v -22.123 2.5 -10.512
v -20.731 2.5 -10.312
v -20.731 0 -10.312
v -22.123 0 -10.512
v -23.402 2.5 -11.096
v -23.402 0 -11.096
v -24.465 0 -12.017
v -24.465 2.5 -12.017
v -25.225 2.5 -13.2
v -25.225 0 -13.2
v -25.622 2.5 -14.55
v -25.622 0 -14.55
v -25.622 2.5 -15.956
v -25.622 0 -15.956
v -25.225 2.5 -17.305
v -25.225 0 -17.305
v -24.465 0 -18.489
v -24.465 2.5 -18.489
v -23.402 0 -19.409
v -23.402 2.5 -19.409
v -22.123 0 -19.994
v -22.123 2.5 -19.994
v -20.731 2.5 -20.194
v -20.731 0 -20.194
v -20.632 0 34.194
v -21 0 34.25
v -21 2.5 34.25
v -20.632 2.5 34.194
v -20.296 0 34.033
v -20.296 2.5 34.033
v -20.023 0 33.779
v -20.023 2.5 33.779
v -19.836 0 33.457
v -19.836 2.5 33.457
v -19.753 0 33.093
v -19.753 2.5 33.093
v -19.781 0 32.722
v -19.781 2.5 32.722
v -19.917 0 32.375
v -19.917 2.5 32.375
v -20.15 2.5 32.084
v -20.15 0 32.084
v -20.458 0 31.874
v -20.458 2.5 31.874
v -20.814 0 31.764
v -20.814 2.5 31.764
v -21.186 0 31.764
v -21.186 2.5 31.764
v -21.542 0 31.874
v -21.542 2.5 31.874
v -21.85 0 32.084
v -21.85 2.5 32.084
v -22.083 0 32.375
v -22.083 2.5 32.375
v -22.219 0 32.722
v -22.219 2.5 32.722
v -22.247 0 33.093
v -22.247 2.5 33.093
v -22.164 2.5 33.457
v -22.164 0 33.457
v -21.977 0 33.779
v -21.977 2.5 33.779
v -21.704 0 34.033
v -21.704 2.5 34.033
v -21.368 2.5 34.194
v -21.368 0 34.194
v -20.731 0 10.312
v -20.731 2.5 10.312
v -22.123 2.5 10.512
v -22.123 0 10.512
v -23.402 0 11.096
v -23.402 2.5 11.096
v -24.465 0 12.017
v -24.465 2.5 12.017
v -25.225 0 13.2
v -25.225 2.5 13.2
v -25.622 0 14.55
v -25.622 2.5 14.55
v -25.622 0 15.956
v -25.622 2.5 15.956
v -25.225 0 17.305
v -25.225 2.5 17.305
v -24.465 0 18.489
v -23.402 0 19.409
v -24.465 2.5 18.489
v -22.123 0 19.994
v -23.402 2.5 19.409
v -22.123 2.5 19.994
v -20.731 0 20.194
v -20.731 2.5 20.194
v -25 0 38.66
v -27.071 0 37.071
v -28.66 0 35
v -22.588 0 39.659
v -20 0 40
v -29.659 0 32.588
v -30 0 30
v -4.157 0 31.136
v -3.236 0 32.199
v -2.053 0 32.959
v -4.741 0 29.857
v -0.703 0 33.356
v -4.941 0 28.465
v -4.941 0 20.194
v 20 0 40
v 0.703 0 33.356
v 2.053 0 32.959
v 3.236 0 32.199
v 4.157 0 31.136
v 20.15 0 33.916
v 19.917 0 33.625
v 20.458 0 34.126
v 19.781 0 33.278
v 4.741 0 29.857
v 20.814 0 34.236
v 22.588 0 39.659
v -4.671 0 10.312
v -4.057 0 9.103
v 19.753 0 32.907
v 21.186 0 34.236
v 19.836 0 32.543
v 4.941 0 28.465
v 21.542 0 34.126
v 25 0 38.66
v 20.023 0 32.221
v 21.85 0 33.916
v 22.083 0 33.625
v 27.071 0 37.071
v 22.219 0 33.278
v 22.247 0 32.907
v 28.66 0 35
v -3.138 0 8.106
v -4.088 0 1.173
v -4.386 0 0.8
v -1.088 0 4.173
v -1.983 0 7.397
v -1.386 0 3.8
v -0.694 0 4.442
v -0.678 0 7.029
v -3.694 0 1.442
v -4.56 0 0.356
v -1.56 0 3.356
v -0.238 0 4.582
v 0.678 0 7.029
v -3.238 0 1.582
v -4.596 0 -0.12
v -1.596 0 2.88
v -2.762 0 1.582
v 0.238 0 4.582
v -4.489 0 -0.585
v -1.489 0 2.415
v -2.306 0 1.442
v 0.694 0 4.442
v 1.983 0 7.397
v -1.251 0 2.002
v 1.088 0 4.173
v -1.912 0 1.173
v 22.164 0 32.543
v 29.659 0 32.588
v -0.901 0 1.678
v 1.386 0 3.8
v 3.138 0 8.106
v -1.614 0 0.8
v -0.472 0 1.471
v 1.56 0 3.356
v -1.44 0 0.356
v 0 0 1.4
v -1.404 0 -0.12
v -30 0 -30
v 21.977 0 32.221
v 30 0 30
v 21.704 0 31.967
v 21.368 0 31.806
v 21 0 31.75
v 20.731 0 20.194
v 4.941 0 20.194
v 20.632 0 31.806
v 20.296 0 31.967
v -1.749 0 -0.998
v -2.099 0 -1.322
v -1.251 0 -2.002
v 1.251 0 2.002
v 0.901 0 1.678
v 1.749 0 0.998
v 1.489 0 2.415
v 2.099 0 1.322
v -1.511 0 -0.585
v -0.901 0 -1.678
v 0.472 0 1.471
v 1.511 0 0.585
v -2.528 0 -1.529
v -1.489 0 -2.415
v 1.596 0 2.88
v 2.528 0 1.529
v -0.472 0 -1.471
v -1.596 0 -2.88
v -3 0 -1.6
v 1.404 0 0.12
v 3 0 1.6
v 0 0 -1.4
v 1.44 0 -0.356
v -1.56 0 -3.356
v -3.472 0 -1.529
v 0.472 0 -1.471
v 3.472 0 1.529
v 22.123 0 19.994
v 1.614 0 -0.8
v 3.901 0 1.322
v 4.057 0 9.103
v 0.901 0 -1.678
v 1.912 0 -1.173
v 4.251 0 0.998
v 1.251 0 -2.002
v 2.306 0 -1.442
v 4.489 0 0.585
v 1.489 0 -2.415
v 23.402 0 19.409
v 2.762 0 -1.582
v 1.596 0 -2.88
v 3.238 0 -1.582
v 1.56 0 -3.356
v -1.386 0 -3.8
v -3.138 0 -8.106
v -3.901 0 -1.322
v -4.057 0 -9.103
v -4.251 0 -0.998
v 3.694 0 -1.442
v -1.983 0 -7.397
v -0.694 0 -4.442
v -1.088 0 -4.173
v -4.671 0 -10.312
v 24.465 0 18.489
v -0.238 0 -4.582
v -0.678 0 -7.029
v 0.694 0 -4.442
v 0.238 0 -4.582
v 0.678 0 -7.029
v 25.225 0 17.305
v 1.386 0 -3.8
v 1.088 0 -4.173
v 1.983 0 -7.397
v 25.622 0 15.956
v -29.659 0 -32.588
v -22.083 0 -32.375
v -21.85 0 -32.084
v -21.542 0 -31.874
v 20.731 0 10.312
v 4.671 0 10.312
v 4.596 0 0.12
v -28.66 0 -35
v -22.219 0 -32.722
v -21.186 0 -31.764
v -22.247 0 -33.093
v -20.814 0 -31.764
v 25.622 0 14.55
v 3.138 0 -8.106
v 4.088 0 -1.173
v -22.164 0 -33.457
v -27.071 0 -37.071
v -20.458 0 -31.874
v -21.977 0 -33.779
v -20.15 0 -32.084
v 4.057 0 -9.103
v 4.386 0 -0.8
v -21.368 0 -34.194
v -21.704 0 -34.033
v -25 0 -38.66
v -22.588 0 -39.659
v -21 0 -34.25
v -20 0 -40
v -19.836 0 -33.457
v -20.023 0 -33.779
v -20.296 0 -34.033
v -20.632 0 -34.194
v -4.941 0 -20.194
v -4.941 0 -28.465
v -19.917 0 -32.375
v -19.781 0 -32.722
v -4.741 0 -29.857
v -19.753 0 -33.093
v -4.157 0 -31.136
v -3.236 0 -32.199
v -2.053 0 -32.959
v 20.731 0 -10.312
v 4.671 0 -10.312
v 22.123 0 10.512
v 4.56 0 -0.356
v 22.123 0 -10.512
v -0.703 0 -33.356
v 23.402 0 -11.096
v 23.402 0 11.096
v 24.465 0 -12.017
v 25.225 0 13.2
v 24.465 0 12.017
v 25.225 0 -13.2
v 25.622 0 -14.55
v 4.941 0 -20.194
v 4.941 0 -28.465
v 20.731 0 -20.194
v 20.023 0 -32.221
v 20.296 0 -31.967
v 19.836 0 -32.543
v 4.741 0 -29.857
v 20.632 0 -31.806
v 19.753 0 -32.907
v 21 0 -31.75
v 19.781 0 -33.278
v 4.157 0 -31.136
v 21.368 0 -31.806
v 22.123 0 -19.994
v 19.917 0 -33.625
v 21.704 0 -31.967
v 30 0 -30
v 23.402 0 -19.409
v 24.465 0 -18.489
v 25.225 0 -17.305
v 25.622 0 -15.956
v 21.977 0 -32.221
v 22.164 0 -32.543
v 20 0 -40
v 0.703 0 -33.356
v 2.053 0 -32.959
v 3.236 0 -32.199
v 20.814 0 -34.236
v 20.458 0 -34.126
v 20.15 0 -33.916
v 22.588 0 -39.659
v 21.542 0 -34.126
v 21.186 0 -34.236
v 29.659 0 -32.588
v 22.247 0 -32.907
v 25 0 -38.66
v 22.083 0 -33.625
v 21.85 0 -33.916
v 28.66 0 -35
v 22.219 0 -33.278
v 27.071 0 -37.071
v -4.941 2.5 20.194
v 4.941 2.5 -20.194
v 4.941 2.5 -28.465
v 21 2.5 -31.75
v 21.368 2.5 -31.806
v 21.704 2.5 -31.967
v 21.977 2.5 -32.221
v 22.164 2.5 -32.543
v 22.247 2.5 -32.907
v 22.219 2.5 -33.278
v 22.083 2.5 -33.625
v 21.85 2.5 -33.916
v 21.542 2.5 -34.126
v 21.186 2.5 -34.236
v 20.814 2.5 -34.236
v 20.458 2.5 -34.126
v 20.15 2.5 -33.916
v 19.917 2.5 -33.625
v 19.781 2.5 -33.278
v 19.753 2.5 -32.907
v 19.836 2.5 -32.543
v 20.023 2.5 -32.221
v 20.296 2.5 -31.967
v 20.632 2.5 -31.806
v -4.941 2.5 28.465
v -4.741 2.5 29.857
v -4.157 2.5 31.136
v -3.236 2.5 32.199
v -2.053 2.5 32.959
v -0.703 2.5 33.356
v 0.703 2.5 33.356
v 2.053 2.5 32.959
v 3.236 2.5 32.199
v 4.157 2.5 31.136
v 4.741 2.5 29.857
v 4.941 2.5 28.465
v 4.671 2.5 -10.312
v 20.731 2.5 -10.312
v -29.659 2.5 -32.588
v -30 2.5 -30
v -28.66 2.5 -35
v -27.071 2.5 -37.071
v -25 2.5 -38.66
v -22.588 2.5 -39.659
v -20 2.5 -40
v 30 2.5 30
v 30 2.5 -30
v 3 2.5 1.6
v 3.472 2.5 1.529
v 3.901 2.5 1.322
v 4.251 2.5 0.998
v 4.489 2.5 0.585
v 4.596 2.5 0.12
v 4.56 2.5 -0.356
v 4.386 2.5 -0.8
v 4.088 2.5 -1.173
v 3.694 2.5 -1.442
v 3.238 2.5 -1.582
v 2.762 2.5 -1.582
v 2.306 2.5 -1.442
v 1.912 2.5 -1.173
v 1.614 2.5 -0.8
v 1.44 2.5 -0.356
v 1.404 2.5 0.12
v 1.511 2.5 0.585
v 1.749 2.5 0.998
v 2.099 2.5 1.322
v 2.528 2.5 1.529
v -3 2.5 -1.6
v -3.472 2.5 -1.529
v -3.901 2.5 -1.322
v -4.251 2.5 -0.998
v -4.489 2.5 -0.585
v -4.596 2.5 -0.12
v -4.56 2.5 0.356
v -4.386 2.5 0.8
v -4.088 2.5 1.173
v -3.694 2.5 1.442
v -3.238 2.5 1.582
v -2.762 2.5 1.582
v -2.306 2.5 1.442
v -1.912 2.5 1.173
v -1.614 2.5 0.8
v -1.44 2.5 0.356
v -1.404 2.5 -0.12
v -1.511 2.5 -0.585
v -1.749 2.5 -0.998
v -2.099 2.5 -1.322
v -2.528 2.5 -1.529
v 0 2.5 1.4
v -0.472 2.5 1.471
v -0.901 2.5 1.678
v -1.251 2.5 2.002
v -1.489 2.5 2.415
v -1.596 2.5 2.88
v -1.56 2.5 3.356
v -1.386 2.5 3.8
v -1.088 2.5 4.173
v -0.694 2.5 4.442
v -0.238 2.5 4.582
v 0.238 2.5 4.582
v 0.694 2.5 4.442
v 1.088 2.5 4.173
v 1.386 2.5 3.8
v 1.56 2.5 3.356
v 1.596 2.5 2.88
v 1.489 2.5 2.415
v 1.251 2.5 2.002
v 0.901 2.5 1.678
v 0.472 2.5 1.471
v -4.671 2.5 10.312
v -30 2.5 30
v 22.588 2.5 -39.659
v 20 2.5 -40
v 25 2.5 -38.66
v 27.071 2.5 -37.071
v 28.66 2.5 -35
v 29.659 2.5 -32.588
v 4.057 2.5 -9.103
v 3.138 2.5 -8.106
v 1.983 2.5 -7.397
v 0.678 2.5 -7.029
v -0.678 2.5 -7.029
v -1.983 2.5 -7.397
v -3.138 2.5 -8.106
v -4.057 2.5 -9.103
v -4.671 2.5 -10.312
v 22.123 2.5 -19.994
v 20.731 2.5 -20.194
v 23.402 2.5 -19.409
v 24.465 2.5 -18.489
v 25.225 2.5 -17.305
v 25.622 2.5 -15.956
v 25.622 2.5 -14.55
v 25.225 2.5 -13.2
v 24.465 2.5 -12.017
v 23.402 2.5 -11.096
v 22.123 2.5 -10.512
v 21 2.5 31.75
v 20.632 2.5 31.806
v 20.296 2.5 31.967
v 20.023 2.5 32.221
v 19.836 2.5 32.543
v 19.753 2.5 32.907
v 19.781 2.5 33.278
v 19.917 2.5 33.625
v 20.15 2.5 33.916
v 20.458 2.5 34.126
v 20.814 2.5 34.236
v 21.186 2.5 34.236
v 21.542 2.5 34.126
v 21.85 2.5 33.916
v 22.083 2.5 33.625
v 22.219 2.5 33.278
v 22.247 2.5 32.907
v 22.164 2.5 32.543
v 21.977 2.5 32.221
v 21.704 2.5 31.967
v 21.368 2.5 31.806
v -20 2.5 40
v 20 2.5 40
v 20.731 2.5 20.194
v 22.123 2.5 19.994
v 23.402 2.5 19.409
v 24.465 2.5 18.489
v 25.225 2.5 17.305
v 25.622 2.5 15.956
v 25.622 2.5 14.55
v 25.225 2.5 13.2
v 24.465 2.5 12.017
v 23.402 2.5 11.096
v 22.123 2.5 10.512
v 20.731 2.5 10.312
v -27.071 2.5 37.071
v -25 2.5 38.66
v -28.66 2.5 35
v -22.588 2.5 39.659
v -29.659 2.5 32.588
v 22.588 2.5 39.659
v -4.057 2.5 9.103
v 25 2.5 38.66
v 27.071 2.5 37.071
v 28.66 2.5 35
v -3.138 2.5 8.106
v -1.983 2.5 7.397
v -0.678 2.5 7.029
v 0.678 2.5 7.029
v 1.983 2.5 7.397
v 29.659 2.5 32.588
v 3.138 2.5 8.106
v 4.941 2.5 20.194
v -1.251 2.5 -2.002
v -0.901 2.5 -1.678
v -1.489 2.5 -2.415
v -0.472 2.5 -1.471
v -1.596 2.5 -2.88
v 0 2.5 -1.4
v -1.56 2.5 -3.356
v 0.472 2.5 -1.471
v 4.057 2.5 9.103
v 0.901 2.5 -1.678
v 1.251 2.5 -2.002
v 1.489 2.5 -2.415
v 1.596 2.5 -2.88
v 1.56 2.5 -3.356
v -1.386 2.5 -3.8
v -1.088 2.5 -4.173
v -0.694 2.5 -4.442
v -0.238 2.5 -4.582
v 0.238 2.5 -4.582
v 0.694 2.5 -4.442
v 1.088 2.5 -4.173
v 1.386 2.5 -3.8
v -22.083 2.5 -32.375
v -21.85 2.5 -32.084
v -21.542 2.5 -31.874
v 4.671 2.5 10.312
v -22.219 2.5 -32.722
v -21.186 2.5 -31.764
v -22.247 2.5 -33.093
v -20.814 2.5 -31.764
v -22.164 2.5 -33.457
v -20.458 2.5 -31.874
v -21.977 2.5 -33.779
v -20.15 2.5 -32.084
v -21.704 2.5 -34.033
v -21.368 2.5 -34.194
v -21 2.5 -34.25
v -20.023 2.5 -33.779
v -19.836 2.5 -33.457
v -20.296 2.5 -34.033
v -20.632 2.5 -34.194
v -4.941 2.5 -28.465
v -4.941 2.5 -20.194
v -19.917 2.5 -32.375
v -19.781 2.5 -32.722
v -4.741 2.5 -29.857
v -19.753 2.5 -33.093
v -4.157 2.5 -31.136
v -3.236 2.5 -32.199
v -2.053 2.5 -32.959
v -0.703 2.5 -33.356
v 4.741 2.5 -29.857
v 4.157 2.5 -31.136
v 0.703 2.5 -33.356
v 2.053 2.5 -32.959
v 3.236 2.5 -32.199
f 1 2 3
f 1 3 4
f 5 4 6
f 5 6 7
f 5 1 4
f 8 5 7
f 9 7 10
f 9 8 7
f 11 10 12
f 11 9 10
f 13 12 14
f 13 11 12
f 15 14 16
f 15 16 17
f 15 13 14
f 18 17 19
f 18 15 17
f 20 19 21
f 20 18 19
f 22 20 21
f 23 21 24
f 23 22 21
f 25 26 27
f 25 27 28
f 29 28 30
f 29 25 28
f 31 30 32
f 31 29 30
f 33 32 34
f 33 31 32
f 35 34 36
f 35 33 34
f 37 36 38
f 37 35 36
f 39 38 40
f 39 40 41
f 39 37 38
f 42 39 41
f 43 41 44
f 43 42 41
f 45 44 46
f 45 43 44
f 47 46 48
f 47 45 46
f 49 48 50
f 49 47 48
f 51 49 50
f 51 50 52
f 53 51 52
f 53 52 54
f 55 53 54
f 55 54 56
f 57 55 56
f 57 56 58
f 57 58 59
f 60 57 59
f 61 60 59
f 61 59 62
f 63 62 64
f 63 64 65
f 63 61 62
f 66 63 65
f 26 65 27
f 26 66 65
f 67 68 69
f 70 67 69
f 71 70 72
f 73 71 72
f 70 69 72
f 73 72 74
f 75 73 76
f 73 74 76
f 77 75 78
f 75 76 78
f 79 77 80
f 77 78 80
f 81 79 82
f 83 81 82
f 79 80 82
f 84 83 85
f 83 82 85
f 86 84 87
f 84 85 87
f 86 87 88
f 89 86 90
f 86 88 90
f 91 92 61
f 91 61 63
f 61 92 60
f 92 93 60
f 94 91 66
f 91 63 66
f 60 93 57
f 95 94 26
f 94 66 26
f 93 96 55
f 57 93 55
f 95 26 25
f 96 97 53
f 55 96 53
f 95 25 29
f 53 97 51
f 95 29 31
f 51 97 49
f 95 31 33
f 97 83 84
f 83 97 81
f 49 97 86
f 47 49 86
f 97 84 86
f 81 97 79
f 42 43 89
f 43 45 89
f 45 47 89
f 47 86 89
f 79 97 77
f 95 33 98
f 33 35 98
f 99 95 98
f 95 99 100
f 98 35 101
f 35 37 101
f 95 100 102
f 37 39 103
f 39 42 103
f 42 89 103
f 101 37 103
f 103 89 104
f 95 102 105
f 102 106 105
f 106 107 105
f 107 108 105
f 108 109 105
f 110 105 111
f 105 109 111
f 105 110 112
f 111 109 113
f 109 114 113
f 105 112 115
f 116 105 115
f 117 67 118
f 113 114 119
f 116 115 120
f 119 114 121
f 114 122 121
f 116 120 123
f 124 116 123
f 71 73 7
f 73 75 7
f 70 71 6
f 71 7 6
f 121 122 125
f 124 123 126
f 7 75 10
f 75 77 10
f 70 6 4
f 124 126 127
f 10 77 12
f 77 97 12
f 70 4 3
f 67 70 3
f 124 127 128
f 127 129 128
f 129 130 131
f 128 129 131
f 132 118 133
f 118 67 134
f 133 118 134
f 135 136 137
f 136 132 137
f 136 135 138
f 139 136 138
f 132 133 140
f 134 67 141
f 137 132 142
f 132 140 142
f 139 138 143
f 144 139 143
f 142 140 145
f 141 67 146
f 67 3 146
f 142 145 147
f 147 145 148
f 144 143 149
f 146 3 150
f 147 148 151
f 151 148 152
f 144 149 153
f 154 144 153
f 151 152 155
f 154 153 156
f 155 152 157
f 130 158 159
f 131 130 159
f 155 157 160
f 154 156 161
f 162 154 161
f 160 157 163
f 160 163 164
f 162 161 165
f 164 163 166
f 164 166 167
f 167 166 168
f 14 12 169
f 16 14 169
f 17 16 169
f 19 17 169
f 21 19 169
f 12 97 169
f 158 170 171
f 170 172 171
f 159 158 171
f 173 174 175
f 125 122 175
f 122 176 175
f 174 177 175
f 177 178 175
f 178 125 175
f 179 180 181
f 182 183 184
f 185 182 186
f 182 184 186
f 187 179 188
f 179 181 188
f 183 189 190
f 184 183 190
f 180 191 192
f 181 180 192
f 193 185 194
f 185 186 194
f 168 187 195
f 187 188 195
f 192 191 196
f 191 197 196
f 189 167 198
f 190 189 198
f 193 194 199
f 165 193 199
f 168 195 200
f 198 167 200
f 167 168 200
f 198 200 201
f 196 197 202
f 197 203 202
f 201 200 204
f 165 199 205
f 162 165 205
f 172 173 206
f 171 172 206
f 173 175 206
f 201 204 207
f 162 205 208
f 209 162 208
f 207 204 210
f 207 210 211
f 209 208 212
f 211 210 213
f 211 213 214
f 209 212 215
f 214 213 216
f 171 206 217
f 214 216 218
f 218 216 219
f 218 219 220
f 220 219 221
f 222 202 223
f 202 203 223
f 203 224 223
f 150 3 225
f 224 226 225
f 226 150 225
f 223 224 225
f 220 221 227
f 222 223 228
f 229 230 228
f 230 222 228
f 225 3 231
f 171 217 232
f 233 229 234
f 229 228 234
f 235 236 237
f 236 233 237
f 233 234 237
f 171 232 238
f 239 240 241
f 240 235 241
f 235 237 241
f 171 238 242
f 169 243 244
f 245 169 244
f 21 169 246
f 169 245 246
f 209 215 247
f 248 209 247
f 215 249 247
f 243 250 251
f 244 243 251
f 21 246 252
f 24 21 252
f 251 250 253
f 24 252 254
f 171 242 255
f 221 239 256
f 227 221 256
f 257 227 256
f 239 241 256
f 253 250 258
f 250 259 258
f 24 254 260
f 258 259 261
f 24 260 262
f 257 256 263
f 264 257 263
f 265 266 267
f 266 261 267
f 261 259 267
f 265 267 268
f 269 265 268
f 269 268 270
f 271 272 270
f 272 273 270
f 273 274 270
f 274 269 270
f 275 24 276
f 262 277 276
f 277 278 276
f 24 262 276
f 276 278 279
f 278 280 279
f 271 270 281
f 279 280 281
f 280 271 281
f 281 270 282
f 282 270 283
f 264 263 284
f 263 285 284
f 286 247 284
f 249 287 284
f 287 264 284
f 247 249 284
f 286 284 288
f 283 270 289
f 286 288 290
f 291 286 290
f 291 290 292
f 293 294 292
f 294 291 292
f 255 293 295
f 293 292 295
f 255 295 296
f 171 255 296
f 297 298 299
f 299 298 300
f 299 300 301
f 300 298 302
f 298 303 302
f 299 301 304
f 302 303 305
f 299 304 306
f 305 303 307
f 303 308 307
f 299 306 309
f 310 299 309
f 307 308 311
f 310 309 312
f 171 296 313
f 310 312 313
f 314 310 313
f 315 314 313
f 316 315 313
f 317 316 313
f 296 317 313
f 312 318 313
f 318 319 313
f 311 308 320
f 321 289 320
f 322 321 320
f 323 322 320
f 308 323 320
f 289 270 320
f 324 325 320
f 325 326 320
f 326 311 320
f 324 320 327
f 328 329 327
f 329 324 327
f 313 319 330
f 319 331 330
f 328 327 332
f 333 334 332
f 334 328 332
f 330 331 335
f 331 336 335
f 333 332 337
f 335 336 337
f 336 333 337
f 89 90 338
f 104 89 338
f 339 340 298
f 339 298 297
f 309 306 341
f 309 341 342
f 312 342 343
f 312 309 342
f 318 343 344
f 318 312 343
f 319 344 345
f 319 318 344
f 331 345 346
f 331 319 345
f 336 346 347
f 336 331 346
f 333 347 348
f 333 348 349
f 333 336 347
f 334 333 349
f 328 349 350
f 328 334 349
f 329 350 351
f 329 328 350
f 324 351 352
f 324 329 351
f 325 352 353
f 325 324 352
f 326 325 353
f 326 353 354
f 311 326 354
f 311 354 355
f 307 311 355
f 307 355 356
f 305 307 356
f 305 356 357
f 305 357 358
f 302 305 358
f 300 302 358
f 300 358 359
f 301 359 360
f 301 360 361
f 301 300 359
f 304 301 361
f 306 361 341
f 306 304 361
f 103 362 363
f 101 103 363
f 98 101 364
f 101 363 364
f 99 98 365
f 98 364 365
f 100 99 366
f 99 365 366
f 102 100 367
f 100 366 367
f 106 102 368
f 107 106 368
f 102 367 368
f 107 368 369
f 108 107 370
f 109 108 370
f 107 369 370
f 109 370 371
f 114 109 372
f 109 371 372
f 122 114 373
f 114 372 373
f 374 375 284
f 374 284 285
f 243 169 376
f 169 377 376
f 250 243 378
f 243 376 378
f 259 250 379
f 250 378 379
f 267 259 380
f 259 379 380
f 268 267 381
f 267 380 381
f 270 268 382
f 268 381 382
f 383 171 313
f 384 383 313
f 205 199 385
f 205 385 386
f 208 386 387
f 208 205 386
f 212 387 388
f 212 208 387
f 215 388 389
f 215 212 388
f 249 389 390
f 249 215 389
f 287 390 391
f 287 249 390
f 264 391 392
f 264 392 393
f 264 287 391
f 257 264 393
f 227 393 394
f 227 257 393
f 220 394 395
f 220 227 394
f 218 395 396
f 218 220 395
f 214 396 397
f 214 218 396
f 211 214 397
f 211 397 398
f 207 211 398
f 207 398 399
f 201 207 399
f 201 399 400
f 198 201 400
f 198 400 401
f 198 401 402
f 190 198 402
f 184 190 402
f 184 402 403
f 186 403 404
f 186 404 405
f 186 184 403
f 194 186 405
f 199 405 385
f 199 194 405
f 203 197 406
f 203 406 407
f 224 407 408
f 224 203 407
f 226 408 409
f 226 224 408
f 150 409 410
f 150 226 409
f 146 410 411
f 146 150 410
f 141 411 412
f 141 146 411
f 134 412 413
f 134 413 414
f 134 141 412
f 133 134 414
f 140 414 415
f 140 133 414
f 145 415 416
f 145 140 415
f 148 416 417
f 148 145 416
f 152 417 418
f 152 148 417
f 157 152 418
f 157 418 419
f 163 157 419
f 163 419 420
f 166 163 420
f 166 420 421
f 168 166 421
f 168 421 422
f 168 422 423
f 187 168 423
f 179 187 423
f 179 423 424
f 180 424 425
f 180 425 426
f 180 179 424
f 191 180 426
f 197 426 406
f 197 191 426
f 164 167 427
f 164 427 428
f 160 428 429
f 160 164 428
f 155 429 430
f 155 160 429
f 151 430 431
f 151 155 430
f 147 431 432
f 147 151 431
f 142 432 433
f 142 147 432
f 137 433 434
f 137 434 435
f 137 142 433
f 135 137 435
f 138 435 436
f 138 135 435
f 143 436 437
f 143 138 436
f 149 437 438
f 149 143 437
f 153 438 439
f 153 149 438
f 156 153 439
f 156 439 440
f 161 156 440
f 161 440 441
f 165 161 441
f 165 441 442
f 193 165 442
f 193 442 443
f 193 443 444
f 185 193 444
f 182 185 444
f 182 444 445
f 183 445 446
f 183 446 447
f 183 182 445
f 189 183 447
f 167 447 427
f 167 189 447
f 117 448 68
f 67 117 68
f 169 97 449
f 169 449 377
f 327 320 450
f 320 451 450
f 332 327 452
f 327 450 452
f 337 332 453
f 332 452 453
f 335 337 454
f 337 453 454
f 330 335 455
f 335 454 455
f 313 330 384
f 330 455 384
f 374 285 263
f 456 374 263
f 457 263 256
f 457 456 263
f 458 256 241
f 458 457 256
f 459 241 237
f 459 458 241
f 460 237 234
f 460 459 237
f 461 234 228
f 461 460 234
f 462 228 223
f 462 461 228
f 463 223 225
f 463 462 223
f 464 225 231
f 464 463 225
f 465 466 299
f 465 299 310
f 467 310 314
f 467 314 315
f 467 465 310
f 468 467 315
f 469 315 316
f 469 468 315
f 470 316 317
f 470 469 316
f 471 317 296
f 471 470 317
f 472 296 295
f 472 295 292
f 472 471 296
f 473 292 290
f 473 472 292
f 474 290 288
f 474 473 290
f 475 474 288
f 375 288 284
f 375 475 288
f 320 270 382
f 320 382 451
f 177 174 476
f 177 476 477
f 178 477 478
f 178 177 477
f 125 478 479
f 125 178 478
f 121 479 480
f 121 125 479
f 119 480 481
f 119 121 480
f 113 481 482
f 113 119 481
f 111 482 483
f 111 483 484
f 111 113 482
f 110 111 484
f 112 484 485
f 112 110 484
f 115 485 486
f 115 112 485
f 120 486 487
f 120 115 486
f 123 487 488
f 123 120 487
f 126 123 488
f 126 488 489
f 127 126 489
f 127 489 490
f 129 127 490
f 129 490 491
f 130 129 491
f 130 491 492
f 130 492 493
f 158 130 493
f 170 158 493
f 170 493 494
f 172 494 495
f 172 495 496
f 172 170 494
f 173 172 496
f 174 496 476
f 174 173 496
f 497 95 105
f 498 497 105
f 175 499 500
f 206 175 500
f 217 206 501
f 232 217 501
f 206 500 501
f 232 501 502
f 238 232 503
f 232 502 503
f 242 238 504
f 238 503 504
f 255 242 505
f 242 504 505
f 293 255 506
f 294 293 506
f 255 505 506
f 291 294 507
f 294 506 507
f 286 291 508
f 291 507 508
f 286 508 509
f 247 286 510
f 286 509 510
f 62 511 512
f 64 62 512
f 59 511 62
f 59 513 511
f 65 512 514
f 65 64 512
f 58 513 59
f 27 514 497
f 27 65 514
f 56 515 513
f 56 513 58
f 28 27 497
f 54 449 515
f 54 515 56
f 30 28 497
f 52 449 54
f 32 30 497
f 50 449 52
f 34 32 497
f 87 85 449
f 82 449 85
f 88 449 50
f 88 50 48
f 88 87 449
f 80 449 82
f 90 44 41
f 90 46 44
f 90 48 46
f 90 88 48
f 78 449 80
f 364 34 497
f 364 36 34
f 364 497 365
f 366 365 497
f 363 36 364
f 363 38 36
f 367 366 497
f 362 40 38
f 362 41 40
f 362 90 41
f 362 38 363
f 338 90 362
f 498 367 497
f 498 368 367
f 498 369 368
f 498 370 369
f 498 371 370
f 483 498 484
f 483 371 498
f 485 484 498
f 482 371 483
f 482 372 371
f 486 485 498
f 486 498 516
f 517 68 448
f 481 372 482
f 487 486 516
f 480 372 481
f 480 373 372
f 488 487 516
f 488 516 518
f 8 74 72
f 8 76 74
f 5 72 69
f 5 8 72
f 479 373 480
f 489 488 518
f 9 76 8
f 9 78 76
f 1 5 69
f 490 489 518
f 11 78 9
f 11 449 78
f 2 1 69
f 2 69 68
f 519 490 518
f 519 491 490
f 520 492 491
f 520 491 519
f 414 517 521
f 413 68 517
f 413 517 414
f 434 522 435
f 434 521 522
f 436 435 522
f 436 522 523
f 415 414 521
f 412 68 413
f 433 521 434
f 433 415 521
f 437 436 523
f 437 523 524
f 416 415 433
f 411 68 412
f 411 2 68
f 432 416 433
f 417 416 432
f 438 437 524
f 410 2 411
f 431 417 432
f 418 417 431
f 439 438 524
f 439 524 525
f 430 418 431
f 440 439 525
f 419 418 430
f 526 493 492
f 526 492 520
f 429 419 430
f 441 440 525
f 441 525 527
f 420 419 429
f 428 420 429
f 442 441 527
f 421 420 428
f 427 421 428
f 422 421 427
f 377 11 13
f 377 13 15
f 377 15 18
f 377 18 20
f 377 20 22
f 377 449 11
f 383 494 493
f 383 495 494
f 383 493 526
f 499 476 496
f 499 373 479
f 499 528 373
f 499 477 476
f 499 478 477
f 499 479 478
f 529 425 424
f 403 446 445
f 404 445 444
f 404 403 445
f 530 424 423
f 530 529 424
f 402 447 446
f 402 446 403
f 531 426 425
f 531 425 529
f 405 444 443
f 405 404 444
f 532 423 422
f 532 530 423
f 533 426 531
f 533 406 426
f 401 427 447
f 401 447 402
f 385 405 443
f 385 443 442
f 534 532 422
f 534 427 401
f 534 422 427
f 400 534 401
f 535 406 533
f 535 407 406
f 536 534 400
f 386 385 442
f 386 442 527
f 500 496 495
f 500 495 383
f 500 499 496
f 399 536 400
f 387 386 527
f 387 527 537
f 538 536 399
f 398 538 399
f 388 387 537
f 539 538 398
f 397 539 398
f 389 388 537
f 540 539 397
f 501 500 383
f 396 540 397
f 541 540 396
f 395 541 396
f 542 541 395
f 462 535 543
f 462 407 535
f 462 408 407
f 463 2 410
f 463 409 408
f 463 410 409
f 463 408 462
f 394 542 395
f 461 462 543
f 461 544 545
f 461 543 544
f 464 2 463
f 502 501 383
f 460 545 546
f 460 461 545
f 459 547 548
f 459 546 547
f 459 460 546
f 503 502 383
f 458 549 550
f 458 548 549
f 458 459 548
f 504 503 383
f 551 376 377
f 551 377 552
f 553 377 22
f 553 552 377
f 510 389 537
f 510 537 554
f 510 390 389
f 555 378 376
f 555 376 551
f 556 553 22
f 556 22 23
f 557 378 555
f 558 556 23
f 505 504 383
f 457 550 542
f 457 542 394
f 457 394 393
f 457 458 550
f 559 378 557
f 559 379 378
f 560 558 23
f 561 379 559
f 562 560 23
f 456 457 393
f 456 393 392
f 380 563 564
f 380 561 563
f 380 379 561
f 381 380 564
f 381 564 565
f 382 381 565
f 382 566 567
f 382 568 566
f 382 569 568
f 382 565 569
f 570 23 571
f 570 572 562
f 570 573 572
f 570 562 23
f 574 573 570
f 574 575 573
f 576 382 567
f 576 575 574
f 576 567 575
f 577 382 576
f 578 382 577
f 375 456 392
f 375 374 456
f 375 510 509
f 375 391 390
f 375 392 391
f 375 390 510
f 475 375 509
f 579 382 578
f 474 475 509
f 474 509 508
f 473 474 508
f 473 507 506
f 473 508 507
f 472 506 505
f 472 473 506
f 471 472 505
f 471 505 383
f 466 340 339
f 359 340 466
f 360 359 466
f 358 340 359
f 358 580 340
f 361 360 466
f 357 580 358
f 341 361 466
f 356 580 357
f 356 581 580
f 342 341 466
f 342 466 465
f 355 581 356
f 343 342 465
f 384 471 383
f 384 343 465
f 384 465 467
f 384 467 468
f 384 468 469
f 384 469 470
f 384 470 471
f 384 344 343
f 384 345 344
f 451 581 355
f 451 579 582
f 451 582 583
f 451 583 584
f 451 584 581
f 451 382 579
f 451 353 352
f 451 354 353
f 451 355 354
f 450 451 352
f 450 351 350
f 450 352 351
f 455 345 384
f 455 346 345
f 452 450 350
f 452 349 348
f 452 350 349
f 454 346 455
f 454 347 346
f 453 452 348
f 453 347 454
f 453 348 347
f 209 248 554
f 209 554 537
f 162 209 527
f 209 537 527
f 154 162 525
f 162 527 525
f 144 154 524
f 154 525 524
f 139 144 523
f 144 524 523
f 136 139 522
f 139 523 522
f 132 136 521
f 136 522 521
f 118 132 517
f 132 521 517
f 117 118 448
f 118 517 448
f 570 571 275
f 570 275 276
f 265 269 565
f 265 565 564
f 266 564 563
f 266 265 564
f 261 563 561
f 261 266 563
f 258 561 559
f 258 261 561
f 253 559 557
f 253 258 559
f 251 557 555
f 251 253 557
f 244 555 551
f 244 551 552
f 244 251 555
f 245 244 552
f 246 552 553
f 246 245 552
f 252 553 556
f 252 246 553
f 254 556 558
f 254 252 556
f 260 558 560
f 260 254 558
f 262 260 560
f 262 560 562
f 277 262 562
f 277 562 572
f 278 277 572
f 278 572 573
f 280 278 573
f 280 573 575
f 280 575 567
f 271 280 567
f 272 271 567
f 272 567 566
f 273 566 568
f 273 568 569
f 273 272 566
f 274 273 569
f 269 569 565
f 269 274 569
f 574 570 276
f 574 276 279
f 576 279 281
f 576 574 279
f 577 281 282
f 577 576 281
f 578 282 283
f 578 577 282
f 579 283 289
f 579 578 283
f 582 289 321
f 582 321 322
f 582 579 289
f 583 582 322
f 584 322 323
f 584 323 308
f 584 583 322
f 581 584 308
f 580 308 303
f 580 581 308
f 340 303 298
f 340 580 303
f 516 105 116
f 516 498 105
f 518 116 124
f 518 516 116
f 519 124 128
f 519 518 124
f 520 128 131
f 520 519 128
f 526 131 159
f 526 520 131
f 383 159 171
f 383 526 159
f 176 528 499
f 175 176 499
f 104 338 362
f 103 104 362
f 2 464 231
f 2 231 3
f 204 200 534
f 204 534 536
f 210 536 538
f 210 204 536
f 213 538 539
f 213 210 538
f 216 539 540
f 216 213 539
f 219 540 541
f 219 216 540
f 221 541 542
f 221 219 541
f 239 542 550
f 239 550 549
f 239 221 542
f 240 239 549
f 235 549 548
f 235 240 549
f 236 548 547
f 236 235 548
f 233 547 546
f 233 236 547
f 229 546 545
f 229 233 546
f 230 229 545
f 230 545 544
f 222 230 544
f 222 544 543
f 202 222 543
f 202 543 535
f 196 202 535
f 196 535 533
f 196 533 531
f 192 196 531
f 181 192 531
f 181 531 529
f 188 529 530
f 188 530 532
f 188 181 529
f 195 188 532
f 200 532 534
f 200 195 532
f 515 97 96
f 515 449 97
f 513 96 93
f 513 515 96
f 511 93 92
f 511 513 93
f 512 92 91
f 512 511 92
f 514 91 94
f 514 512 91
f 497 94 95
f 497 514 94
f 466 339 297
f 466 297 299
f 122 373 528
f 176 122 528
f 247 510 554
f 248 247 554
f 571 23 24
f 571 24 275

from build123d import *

# Parameters (mm, degrees)
SKETCH_1_W          = 60
SKETCH_1_H          = 80
SKETCH_1_R          = 1.25
SKETCH_1_R_2        = 1.6
EXTRUDE_1_DEPTH     = 2.5
FILLET_1_R          = 10
CUT_EXTRUDE_1_DEPTH = 2.5
CUT_EXTRUDE_2_DEPTH = 2.5


with BuildPart() as part:
    # 草图1 → 凸台-拉伸1 (new body)
    with BuildSketch(Plane(origin=(0, 0, 0), x_dir=(1, 0, 0), z_dir=(0, 1, 0))):
        Rectangle(SKETCH_1_W, SKETCH_1_H)
        with Locations(Location((21, 33, 0), (0, 0, 270))):
            Circle(SKETCH_1_R, mode=Mode.SUBTRACT)
        with Locations(Location((-21, 33, 0), (0, 0, 90))):
            Circle(SKETCH_1_R, mode=Mode.SUBTRACT)
        with Locations(Location((-21, -33, 0), (0, 0, 270))):
            Circle(SKETCH_1_R, mode=Mode.SUBTRACT)
        with Locations(Location((21, -33, 0), (0, 0, 90))):
            Circle(SKETCH_1_R, mode=Mode.SUBTRACT)
        with Locations(Location((0, 3, 0), (0, 0, 270))):
            Circle(SKETCH_1_R_2, mode=Mode.SUBTRACT)
        with Locations(Location((3, 0, 0), (0, 0, 270))):
            Circle(SKETCH_1_R_2, mode=Mode.SUBTRACT)
        with Locations(Location((0, -3, 0), (0, 0, 90))):
            Circle(SKETCH_1_R_2, mode=Mode.SUBTRACT)
        with Locations(Location((-3, 0, 0), (0, 0, 90))):
            Circle(SKETCH_1_R_2, mode=Mode.SUBTRACT)
    extrude(amount=EXTRUDE_1_DEPTH)

    # 圆角1
    fillet_1_edges = [part.edges().sort_by_distance(p)[0] for p in [
        (30, 1.25, 40),
        (-30, 1.25, 40),
        (-30, 1.25, -40),
        (30, 1.25, -40),
    ]]
    fillet(fillet_1_edges, radius=FILLET_1_R)

    # 草图2 → 切除-拉伸1 (cut)
    with BuildSketch(Plane(origin=(0, 2.5, 0), x_dir=(1, 0, 0), z_dir=(0, 1, 0))):
        with BuildLine():
            Line((-20.730933361, 20.193862548), (20.730933361, 20.193862548))
            ThreePointArc((20.730933361, 20.193862548), (25.671984835, 15.252811074), (20.730933361, 10.311759599))
            Line((20.730933361, 10.311759599), (-20.730933361, 10.311759599))
            ThreePointArc((-20.730933361, 10.311759599), (-25.671984835, 15.252811074), (-20.730933361, 20.193862548))
        make_face()
        with BuildLine():
            Line((-20.730933361, -20.193862548), (20.730933361, -20.193862548))
            ThreePointArc((20.730933361, -20.193862548), (25.671984835, -15.252811074), (20.730933361, -10.311759599))
            Line((20.730933361, -10.311759599), (-20.730933361, -10.311759599))
            ThreePointArc((-20.730933361, -10.311759599), (-25.671984835, -15.252811074), (-20.730933361, -20.193862548))
        make_face()
    extrude(amount=-CUT_EXTRUDE_1_DEPTH, mode=Mode.SUBTRACT)

    # 草图3 → 切除-拉伸2 (cut)
    with BuildSketch(Plane(origin=(0, 2.5, 0), x_dir=(1, 0, 0), z_dir=(0, 1, 0))):
        with BuildLine():
            Line((-4.941051475, 11.922972036), (-4.941051475, 28.46475306))
            ThreePointArc((-4.941051475, 28.46475306), (0, 33.405804535), (4.941051475, 28.46475306))
            Line((4.941051475, 28.46475306), (4.941051475, 11.922972036))
            ThreePointArc((4.941051475, 11.922972036), (0, 6.981920562), (-4.941051475, 11.922972036))
        make_face()
        with BuildLine():
            Line((-4.941051475, -11.922972036), (-4.941051475, -28.46475306))
            ThreePointArc((-4.941051475, -28.46475306), (0, -33.405804535), (4.941051475, -28.46475306))
            Line((4.941051475, -28.46475306), (4.941051475, -11.922972036))
            ThreePointArc((4.941051475, -11.922972036), (0, -6.981920562), (-4.941051475, -11.922972036))
        make_face()
    extrude(amount=-CUT_EXTRUDE_2_DEPTH, mode=Mode.SUBTRACT)


solid = part.part
